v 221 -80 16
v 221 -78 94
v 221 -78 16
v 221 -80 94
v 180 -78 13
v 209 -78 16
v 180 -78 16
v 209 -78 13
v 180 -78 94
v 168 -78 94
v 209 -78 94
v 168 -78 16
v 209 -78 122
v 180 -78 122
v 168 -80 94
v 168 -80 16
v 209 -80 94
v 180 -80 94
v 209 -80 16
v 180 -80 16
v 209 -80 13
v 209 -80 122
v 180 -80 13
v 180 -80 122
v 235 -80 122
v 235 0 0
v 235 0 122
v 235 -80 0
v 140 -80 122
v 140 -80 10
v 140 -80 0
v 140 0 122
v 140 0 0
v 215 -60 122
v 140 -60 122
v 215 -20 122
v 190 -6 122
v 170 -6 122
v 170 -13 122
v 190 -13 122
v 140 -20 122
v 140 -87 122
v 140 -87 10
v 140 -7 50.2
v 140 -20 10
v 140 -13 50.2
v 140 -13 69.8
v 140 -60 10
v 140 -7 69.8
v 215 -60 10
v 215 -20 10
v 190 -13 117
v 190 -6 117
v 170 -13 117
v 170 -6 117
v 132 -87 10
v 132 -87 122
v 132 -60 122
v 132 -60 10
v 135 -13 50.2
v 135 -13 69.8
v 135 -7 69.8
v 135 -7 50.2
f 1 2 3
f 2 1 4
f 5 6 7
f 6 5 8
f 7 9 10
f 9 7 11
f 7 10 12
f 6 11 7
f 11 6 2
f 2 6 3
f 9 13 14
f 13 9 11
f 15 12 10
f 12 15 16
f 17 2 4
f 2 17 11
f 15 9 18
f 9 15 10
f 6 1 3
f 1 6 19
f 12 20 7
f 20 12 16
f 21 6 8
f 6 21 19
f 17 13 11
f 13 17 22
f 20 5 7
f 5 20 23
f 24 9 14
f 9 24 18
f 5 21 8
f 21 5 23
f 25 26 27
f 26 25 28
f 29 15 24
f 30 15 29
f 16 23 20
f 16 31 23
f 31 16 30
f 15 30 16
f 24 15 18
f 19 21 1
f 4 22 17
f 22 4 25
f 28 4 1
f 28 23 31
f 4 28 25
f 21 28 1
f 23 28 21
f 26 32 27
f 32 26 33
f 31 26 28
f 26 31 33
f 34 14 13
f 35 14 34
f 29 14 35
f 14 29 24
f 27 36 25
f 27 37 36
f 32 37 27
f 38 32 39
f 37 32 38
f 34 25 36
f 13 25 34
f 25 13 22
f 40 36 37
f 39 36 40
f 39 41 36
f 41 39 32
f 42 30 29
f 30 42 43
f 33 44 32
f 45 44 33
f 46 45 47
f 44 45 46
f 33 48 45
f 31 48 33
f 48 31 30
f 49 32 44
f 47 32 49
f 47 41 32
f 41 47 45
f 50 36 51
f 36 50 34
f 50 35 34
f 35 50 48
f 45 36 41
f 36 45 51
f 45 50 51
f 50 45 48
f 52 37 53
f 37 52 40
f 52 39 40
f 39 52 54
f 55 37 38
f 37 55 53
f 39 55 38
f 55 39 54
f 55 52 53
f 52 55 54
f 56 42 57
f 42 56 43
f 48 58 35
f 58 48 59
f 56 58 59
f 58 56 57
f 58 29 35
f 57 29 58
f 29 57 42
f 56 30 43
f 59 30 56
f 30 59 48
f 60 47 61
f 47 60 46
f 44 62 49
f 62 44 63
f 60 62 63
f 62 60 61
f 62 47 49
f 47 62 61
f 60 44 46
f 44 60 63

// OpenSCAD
rotate(a=90,v=[1,0,0]) {
difference() {
    union() {
        difference() {
            cube([235,290,80]); // bottom
            
            union() {
                translate([168,16,78])
                cube([53,78,3]);    // nfc
                translate([180,13,78])
                cube([29,116,3]);    // nfc module
                translate([187,122,78])
                cube([14,20,3]);    // nfc line
                
                translate([50,-1,30])
                cube([57,11,5]);    // printer
            }
        }
        
        translate([0,60,80])
        rotate(a=90,v=[0,1,0]) {
            cylinder(r=60,h=140,$fn=50);    // front
        }
        
        difference() {
            translate([0,60,80])
            cube([140,65,60]);  // front2
        }
        
        difference() {
            translate([0,122,80])
            cube([235,168,60]); // back
            
            union() {
                translate([187,122,79])
                cube([14,20,6]);    // nfc line
                
                translate([21,140,138])
                cube([193,112,3]);  // lcd
                translate([35,144,134])
                cube([167,101,5]);  // lcd bottom
                translate([91,172,120])
                cube([65,56,15]);   // lcd module
                translate([97,140,130])
                cube([40,32,10]);    // lcd line
                
                translate([45,266,120])
                cube([145,10,21]);  // back lid
            }
        }
    }
    
    union() {
        translate([20,10,20])
        cube([195,260,40]); // inside bottom
        
        translate([20,10,60])
        cube([113,130,27]); // inside printer
        translate([20,140,60])
        cube([195,130,61]); // inside lcd
        
        translate([45,266,20])
        cube([145,25,101]); // inside back lid
        translate([45,266,10])
        cube([145,10,11]);  // inside bottom lid
        
        translate([-1,-1,-1])
        cube([141,292,142]);
        translate([140,122,-1])
        cube([96,169,142]);
        
        translate([170,117,6])
        cube([20,6,7]);     // in
    }
}

translate([132,10,60])
cube([8,112,27]);   // 133+7,10+130,60+27

translate([135,50.2,7])
cube([6,19.6,6]);       // on
}
